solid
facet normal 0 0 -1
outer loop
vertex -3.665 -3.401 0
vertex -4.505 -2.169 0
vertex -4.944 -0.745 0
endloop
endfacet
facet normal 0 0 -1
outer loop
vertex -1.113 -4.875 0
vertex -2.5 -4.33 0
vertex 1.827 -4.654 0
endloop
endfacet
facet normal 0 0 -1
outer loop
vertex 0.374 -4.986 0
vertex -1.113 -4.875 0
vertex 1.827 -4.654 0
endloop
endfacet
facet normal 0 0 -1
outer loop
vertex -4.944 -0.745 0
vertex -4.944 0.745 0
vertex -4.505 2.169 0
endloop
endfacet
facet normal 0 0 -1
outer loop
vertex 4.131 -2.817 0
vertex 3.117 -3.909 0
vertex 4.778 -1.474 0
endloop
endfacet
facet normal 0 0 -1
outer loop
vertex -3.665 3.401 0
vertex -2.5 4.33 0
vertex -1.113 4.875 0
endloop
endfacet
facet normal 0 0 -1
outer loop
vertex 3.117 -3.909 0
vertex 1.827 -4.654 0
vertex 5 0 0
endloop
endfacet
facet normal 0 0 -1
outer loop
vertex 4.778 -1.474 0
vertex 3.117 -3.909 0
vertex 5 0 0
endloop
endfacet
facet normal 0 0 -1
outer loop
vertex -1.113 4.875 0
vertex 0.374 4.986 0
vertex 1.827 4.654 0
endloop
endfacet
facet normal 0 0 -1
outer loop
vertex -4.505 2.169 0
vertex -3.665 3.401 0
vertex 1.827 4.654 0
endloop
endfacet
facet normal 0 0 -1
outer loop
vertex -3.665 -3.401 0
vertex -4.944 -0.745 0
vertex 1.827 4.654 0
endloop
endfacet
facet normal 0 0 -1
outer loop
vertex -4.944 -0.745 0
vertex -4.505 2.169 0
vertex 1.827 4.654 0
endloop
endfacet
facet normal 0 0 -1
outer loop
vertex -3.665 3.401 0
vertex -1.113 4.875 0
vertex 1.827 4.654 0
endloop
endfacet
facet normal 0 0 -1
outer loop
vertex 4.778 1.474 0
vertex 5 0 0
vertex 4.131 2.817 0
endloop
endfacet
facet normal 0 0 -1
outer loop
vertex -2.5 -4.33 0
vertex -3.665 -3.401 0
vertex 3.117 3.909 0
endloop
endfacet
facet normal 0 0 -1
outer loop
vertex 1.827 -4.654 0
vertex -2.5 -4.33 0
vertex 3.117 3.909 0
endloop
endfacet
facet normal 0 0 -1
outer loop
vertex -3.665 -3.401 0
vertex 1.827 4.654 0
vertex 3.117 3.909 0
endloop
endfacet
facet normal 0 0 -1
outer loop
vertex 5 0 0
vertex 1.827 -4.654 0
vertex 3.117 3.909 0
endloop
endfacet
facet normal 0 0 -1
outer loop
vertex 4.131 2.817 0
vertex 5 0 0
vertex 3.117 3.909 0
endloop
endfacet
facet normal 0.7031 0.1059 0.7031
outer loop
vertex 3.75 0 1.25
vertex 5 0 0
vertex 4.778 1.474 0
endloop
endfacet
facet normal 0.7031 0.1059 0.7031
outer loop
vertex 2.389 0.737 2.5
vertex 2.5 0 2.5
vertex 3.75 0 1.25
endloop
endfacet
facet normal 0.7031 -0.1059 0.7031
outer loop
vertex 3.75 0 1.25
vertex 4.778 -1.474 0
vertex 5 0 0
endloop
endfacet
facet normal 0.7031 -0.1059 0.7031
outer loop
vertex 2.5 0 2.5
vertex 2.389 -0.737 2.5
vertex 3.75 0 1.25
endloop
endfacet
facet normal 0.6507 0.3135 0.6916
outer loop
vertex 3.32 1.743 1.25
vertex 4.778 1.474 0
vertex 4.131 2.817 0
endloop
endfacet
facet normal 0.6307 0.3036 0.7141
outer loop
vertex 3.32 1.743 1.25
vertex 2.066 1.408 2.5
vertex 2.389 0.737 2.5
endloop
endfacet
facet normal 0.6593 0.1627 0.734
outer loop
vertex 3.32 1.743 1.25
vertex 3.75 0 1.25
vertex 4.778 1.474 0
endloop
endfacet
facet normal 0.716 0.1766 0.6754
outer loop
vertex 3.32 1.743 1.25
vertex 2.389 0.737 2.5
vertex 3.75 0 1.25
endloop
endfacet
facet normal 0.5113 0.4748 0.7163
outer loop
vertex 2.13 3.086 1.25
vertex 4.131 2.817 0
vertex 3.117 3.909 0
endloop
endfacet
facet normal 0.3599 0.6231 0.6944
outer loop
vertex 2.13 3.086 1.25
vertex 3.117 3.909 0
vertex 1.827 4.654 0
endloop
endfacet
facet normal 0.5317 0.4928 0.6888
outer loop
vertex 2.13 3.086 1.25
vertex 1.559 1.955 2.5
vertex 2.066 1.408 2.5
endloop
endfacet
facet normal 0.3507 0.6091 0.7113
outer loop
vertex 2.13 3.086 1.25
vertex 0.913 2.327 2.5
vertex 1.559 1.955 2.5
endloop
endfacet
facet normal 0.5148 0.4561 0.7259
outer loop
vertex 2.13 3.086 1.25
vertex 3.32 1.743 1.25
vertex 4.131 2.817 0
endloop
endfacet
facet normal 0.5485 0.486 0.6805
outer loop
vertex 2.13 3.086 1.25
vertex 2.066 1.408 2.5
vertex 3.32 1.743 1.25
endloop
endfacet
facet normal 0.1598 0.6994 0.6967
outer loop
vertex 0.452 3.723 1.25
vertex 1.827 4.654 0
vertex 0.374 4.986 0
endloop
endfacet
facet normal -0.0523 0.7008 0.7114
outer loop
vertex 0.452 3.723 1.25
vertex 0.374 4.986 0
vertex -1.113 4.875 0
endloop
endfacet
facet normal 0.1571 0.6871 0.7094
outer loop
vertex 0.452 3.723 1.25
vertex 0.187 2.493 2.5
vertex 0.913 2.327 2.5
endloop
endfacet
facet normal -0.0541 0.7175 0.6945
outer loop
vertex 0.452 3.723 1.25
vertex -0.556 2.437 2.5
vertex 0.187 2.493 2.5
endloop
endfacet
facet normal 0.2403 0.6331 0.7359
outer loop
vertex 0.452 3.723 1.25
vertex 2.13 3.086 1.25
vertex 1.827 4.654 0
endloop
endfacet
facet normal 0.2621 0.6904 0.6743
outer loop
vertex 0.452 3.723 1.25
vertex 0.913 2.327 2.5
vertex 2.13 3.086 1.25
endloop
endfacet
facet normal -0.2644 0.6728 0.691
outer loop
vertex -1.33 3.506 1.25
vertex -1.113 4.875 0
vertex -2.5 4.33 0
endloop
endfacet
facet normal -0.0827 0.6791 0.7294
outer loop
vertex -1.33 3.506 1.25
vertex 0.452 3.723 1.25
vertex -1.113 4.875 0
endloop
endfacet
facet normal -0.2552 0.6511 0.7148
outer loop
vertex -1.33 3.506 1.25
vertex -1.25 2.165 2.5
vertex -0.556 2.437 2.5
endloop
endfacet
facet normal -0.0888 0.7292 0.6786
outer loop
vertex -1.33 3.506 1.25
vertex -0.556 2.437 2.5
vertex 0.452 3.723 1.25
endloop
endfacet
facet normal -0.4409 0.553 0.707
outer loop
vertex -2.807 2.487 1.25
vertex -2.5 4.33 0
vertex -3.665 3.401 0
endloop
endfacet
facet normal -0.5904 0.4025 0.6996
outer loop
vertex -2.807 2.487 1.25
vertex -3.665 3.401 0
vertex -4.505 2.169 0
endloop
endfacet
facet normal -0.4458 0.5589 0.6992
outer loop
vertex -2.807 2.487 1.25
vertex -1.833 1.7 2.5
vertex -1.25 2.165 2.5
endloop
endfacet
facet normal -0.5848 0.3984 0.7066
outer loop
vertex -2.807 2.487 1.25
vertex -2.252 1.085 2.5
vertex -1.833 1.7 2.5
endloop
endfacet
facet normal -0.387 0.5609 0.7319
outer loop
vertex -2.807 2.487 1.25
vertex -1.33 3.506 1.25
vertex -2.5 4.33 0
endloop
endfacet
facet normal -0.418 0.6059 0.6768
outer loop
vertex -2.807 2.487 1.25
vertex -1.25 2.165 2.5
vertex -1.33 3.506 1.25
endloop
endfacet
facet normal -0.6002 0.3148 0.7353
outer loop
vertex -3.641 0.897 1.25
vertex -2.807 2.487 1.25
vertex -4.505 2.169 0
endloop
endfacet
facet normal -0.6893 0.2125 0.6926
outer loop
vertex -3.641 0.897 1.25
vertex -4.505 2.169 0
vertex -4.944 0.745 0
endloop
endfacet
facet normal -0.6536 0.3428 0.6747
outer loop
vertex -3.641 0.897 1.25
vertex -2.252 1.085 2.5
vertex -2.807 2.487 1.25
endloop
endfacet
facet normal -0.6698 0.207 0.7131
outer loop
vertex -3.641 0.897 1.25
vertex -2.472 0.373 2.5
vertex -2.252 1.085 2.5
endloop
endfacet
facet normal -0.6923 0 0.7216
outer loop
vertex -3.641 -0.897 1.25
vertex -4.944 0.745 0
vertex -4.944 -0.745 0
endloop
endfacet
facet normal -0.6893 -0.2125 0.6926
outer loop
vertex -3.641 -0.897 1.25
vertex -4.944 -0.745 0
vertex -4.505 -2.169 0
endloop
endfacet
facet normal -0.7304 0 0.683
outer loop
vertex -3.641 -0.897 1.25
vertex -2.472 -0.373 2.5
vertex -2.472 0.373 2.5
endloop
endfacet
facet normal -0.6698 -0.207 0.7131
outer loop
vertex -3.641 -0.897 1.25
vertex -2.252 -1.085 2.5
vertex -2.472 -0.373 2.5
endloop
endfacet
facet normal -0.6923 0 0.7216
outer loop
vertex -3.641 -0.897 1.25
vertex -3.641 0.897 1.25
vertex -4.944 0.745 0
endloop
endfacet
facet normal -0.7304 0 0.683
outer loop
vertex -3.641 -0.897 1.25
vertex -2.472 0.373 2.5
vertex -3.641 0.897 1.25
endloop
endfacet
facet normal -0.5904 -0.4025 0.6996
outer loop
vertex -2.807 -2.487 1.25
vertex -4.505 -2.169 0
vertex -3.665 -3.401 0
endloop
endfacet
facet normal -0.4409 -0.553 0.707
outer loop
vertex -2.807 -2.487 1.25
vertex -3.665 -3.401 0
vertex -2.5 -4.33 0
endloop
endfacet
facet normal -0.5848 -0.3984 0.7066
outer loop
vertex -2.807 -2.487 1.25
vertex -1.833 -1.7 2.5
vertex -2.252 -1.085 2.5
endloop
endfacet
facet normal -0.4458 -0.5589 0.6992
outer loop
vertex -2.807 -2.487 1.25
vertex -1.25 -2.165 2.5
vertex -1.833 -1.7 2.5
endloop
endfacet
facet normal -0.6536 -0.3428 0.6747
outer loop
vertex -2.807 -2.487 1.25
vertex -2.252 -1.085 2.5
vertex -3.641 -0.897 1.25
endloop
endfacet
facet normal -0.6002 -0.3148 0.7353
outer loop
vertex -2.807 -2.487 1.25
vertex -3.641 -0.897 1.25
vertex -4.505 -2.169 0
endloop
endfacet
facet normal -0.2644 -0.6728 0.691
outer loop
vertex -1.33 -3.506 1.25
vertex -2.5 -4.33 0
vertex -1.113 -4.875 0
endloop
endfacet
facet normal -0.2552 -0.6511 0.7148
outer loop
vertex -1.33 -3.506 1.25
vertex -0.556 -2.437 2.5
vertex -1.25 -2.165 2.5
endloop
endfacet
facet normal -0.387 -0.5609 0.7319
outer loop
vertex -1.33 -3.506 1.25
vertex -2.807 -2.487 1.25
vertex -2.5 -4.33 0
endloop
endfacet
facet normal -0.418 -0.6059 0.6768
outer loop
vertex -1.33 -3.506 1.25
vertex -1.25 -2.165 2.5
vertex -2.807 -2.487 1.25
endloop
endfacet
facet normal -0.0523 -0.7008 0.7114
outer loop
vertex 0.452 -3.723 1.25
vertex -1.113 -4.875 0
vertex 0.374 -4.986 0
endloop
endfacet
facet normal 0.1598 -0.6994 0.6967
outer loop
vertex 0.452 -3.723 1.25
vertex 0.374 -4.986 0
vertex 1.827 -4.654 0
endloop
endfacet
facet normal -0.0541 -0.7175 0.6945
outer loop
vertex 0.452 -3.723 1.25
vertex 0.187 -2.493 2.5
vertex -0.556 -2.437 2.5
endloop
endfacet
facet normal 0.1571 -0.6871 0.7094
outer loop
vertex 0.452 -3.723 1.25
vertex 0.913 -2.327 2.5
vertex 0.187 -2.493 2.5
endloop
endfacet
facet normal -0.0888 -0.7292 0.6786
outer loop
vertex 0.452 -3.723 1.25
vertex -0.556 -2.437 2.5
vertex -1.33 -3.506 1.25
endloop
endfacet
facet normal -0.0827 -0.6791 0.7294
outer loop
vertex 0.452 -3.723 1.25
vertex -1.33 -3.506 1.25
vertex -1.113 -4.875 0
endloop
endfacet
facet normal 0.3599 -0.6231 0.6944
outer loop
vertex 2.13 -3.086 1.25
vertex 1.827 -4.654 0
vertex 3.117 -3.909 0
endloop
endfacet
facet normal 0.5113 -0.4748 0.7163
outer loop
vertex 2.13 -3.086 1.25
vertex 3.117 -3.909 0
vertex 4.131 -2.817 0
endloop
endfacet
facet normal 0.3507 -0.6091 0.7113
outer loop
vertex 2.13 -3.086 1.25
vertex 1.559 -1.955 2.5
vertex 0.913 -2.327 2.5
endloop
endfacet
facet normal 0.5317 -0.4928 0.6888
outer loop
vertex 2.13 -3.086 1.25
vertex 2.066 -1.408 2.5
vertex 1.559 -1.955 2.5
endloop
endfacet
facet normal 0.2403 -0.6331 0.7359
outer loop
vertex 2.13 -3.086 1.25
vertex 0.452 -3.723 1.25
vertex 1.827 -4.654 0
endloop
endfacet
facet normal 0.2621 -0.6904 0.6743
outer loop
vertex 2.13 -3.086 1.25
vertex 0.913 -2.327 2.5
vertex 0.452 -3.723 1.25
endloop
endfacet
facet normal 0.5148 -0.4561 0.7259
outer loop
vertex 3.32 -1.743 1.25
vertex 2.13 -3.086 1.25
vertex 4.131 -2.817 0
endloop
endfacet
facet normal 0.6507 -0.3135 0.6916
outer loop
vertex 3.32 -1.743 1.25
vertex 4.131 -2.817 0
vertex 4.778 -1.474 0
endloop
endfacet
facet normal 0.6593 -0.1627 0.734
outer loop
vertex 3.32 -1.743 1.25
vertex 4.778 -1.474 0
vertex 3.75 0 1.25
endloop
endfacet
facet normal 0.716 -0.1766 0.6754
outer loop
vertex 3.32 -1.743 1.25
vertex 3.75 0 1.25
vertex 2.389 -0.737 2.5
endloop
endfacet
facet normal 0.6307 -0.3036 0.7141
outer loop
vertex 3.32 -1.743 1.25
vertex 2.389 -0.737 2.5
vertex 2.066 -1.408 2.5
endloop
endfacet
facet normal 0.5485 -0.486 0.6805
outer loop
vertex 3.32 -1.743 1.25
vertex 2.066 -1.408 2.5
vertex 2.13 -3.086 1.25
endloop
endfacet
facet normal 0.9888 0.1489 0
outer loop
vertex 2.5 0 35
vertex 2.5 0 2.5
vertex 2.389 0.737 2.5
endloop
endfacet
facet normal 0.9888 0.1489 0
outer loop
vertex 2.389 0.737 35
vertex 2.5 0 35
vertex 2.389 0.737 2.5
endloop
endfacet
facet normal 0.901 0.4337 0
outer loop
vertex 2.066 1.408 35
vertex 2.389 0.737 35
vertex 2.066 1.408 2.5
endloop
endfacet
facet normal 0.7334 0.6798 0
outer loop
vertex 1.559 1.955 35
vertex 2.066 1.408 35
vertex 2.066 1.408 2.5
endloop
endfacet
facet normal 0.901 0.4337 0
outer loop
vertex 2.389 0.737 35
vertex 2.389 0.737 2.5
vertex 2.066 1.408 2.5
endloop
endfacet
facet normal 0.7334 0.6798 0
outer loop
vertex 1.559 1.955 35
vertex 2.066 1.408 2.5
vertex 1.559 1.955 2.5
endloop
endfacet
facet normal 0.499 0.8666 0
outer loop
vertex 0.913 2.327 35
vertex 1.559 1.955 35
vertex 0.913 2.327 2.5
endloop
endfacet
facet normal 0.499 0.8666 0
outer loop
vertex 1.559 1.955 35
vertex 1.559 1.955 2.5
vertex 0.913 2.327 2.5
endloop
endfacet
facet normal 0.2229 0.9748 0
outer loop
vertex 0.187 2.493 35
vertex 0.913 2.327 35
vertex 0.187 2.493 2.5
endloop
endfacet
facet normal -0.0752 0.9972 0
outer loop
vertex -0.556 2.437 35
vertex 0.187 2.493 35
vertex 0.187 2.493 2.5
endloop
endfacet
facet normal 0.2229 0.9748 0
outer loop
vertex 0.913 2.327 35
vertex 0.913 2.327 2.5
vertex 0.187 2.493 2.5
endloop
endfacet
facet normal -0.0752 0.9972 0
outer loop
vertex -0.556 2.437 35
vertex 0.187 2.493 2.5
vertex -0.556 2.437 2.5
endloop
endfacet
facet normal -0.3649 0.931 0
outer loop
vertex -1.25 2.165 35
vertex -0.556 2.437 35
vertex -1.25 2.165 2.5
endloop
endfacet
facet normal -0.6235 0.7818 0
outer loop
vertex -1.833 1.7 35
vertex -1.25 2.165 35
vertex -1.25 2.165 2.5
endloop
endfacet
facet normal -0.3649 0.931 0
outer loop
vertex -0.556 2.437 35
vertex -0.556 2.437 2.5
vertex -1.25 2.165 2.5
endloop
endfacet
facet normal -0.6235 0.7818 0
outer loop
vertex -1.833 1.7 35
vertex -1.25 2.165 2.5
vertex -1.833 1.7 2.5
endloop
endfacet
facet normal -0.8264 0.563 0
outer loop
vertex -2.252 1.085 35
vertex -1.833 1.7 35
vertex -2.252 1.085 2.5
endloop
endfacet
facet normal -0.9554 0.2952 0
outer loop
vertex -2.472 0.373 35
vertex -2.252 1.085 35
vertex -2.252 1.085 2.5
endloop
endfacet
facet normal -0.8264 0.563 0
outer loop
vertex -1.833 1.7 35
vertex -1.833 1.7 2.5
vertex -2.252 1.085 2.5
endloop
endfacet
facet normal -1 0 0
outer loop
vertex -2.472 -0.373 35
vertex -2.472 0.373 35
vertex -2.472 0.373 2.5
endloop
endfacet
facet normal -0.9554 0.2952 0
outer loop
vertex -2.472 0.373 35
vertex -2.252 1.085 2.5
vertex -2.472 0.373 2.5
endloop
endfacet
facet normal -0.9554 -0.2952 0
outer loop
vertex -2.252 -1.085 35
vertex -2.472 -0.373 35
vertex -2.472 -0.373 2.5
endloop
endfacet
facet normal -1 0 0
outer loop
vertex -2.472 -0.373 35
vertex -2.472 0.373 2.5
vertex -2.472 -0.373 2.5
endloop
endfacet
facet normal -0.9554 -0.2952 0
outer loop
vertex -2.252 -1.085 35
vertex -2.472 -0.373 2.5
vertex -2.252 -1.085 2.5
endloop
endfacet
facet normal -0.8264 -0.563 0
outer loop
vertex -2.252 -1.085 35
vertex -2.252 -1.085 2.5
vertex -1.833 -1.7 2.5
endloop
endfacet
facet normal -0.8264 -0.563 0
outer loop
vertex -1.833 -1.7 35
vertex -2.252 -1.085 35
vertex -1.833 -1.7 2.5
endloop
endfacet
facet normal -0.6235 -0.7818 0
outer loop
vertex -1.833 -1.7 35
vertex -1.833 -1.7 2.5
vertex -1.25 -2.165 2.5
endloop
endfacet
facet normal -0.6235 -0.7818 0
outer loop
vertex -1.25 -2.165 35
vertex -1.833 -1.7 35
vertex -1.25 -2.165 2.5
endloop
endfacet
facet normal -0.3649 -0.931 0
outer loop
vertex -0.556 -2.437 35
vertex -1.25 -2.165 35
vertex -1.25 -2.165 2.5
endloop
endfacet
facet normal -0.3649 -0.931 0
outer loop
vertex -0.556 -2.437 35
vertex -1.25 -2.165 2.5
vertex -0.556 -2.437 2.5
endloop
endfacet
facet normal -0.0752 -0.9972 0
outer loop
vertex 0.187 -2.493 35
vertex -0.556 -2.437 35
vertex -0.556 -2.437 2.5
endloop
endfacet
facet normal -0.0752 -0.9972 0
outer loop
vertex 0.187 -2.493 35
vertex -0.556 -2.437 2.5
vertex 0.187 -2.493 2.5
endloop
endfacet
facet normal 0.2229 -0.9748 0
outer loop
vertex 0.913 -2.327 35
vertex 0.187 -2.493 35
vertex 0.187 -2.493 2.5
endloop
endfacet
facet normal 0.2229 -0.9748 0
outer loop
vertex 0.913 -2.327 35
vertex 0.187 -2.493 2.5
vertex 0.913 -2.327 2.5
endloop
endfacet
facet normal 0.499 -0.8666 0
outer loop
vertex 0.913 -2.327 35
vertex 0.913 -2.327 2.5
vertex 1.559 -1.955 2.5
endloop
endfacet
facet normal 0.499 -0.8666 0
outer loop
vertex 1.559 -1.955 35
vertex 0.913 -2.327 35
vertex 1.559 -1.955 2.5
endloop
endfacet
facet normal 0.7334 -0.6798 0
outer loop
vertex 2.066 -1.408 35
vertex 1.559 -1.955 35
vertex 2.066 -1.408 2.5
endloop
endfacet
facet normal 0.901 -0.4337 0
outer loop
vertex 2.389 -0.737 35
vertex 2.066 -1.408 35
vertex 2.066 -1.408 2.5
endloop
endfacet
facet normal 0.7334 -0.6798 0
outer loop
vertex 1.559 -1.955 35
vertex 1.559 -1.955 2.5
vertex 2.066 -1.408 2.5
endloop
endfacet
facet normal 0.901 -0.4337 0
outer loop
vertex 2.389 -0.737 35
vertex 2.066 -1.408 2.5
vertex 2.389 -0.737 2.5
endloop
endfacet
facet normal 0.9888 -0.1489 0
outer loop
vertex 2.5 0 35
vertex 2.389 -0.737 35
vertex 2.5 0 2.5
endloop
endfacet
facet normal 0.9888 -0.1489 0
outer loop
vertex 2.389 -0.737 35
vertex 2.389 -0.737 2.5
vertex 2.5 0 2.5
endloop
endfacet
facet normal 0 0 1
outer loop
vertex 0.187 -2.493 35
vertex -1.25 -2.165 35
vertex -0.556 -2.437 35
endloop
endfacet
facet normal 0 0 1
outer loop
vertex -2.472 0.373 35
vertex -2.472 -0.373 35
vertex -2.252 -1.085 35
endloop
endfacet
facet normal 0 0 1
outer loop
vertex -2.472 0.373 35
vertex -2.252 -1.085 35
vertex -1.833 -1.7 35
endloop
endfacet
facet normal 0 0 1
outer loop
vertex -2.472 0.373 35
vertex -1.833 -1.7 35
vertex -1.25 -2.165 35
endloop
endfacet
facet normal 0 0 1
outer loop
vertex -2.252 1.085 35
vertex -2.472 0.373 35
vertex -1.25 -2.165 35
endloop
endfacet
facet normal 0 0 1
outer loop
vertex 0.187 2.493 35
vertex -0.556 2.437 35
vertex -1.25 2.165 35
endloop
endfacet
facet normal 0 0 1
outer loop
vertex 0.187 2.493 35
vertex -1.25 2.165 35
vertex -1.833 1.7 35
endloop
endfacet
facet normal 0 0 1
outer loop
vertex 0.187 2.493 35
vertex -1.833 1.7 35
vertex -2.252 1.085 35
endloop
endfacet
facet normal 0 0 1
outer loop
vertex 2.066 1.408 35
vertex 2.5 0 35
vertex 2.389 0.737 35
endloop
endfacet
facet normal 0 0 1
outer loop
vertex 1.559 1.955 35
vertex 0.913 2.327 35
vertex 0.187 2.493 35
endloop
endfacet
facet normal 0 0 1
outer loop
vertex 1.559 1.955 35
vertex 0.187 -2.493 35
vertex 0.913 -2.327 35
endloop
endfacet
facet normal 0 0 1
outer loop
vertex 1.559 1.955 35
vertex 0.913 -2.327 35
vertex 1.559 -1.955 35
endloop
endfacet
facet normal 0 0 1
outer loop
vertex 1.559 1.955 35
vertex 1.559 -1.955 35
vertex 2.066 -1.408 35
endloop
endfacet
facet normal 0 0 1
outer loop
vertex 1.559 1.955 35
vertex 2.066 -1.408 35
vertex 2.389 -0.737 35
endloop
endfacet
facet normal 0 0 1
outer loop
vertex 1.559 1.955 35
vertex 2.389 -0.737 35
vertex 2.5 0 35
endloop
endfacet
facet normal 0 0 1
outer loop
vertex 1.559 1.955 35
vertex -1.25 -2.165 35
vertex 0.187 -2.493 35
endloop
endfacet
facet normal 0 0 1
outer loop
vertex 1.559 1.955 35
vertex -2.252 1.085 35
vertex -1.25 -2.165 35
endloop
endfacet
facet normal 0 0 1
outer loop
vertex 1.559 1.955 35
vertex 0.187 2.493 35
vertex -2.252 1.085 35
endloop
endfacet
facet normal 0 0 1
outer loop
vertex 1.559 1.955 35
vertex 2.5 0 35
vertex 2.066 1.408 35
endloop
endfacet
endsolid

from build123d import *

# Parameters (mm, degrees)
F0_R     = 5
F1_DEPTH = 2.5
F2_SIZE  = 2.49999
F3_DEPTH = 32.5


# Not quite as in the source:
# - a fillet or chamfer is up to 0.001 mm smaller than in the source, because OpenCascade refuses the exact size


with BuildPart() as f1:
    # F0 (on Top) → F1 (new body)
    with BuildSketch(Plane.XY):
        Circle(F0_R)
    extrude(amount=F1_DEPTH)

    # F2 (size 2.5 in the source; OpenCascade refuses exactly that, so slightly less here)
    f2_edges = [f1.edges().sort_by_distance(p)[0] for p in [
        (-5, 0, 2.5),
    ]]
    chamfer(f2_edges, length=F2_SIZE)

    # F3 (add): a face of the model
    f3_faces = [f1.faces().sort_by_distance(p)[0] for p in [
        (0, 0, 2.5),
    ]]
    extrude(f3_faces, amount=F3_DEPTH)


solid = f1.part
